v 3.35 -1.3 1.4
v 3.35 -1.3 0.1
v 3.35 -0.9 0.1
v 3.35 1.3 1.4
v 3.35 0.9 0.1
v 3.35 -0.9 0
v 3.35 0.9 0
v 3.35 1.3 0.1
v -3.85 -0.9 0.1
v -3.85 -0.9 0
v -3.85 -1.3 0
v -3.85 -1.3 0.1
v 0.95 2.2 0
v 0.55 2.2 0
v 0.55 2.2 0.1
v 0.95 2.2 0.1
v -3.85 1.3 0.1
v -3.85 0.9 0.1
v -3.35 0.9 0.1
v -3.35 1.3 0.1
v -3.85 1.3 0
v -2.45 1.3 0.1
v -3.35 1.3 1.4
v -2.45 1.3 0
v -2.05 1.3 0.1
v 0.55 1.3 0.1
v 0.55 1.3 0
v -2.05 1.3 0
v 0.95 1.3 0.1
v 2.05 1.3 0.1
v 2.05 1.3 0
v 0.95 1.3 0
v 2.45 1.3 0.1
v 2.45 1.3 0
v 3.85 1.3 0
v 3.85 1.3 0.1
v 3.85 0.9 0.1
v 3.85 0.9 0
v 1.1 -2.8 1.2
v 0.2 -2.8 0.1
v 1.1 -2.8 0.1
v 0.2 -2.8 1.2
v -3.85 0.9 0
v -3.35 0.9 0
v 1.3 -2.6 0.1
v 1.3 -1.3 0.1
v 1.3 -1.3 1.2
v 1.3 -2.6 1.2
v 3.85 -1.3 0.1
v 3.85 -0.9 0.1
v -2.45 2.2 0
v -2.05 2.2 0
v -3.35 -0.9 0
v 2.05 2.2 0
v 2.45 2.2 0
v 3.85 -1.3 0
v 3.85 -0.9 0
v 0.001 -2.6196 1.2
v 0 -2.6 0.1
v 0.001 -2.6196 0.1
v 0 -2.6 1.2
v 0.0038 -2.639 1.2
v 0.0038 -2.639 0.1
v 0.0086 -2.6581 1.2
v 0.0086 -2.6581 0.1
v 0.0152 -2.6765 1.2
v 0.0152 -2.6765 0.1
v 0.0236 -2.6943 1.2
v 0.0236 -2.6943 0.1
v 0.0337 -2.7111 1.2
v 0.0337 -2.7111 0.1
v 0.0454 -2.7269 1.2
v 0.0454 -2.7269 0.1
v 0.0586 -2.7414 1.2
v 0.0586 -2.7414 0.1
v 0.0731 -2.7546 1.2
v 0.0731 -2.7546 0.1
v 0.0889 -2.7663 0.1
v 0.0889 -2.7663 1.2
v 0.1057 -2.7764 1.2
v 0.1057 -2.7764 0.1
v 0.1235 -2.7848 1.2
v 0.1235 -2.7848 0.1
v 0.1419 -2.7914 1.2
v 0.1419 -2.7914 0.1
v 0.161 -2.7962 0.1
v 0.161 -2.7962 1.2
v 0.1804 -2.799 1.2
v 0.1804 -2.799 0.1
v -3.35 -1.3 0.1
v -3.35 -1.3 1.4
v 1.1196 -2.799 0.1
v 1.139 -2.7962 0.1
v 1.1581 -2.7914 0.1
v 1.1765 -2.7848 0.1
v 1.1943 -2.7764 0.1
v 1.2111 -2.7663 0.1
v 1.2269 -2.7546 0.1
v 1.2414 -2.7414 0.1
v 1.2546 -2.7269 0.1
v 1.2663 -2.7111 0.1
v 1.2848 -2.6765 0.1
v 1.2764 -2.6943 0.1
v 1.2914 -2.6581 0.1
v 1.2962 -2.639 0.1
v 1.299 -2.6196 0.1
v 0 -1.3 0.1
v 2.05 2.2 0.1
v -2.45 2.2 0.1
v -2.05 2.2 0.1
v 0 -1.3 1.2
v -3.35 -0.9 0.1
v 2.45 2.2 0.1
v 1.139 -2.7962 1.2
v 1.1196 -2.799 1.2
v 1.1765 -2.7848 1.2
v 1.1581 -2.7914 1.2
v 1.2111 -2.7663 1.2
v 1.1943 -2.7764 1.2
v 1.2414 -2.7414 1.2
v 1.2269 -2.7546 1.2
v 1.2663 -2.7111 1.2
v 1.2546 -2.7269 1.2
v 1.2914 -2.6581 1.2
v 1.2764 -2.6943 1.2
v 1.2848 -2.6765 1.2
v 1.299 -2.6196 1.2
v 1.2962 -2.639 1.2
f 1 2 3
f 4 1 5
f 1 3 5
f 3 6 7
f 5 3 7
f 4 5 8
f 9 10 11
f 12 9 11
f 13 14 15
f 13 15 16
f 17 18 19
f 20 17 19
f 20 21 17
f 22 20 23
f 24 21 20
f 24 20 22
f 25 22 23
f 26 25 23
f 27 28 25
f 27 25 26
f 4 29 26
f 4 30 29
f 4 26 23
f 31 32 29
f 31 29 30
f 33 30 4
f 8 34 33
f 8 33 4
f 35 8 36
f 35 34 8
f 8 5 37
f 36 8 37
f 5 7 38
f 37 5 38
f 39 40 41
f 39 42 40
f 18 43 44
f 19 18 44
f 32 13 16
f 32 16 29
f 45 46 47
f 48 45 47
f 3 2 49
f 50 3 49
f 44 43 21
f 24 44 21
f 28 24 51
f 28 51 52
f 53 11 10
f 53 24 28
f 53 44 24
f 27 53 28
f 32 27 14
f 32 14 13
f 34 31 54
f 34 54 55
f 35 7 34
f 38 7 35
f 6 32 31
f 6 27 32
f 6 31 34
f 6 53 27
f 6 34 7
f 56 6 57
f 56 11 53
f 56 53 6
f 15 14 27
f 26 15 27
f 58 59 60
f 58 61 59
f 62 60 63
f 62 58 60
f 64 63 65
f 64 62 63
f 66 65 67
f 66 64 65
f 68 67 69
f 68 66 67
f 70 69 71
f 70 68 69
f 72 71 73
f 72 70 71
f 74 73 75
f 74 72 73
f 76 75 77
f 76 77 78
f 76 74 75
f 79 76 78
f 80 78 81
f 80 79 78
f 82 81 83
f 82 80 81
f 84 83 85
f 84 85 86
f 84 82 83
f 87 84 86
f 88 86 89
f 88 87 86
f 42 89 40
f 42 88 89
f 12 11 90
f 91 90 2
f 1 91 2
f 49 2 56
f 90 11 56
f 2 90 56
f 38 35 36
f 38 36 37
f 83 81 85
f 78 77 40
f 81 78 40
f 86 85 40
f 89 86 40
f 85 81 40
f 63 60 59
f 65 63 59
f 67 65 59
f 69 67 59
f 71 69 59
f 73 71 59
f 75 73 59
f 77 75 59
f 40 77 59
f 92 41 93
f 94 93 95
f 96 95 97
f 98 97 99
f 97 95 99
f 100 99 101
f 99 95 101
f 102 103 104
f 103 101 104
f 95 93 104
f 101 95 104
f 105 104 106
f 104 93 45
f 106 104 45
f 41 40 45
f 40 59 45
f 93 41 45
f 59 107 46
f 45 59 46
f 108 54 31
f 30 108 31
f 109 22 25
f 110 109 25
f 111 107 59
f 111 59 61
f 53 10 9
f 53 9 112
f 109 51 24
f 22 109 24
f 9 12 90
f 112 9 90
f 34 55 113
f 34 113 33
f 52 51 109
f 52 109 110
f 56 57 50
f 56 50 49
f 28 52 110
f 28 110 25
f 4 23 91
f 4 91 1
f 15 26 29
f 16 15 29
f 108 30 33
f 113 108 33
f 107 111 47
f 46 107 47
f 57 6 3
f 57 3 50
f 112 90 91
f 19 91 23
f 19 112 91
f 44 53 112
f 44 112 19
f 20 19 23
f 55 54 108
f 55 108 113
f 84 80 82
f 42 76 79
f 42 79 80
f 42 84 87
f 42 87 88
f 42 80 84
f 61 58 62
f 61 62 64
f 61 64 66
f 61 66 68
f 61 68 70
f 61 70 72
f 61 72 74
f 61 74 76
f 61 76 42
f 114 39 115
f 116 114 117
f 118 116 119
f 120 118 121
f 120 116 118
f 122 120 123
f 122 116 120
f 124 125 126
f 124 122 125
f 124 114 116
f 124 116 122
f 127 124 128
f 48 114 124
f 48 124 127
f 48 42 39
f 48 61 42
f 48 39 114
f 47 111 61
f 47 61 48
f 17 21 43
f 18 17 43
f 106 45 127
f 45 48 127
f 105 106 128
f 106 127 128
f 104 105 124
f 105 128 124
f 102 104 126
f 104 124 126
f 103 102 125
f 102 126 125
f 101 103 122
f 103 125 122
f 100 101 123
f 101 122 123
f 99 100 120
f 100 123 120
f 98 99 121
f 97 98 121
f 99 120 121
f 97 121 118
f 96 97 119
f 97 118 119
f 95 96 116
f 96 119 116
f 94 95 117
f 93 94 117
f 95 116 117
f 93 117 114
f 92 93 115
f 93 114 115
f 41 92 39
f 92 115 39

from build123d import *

# Parameters (mm, degrees)
F0_W     = 6.7
F0_H     = 2.6
F1_DEPTH = 1.4
F2_W     = 1.3
F2_H     = 1.1
F3_DEPTH = 1.5
F4_W     = 0.5
F4_H     = 0.4
F4_W_2   = 0.4
F4_H_2   = 0.9
F5_DEPTH = 0.1
F6_R     = 0.2


with BuildPart() as f1:
    # F0 (on Top) → F1 (new body)
    with BuildSketch(Plane.XY):
        Rectangle(F0_W, F0_H)
    extrude(amount=F1_DEPTH)

    # F4 (on face) → F5 (join)
    with BuildSketch(Plane(origin=(0, 0, 0), x_dir=(1, 0, 0), z_dir=(0, 0, -1))):
        with Locations((-3.6, 1.1)):
            Rectangle(F4_W, F4_H)
        with Locations((-3.6, -1.1)):
            Rectangle(F4_W, F4_H)
        with Locations((3.6, -1.1)):
            Rectangle(F4_W, F4_H)
        with Locations((3.6, 1.1)):
            Rectangle(F4_W, F4_H)
        with Locations((0.75, -1.75)):
            Rectangle(F4_W_2, F4_H_2)
        with Locations((2.25, -1.75)):
            Rectangle(F4_W_2, F4_H_2)
        with Locations((-2.25, -1.75)):
            Rectangle(F4_W_2, F4_H_2)
    extrude(amount=-F5_DEPTH)


with BuildPart() as f3:
    # F2 (on face) → F3 (new body)
    with BuildSketch(Plane.XZ.offset(1.3)):
        with Locations((0.65, 0.65)):
            Rectangle(F2_W, F2_H)
    extrude(amount=F3_DEPTH)

    # F6
    f6_edges = [f3.edges().sort_by_distance(p)[0] for p in [
        (0, -2.8, 0.65),
        (1.3, -2.8, 0.65),
    ]]
    fillet(f6_edges, radius=F6_R)


solid = Compound([f1.part, f3.part])
